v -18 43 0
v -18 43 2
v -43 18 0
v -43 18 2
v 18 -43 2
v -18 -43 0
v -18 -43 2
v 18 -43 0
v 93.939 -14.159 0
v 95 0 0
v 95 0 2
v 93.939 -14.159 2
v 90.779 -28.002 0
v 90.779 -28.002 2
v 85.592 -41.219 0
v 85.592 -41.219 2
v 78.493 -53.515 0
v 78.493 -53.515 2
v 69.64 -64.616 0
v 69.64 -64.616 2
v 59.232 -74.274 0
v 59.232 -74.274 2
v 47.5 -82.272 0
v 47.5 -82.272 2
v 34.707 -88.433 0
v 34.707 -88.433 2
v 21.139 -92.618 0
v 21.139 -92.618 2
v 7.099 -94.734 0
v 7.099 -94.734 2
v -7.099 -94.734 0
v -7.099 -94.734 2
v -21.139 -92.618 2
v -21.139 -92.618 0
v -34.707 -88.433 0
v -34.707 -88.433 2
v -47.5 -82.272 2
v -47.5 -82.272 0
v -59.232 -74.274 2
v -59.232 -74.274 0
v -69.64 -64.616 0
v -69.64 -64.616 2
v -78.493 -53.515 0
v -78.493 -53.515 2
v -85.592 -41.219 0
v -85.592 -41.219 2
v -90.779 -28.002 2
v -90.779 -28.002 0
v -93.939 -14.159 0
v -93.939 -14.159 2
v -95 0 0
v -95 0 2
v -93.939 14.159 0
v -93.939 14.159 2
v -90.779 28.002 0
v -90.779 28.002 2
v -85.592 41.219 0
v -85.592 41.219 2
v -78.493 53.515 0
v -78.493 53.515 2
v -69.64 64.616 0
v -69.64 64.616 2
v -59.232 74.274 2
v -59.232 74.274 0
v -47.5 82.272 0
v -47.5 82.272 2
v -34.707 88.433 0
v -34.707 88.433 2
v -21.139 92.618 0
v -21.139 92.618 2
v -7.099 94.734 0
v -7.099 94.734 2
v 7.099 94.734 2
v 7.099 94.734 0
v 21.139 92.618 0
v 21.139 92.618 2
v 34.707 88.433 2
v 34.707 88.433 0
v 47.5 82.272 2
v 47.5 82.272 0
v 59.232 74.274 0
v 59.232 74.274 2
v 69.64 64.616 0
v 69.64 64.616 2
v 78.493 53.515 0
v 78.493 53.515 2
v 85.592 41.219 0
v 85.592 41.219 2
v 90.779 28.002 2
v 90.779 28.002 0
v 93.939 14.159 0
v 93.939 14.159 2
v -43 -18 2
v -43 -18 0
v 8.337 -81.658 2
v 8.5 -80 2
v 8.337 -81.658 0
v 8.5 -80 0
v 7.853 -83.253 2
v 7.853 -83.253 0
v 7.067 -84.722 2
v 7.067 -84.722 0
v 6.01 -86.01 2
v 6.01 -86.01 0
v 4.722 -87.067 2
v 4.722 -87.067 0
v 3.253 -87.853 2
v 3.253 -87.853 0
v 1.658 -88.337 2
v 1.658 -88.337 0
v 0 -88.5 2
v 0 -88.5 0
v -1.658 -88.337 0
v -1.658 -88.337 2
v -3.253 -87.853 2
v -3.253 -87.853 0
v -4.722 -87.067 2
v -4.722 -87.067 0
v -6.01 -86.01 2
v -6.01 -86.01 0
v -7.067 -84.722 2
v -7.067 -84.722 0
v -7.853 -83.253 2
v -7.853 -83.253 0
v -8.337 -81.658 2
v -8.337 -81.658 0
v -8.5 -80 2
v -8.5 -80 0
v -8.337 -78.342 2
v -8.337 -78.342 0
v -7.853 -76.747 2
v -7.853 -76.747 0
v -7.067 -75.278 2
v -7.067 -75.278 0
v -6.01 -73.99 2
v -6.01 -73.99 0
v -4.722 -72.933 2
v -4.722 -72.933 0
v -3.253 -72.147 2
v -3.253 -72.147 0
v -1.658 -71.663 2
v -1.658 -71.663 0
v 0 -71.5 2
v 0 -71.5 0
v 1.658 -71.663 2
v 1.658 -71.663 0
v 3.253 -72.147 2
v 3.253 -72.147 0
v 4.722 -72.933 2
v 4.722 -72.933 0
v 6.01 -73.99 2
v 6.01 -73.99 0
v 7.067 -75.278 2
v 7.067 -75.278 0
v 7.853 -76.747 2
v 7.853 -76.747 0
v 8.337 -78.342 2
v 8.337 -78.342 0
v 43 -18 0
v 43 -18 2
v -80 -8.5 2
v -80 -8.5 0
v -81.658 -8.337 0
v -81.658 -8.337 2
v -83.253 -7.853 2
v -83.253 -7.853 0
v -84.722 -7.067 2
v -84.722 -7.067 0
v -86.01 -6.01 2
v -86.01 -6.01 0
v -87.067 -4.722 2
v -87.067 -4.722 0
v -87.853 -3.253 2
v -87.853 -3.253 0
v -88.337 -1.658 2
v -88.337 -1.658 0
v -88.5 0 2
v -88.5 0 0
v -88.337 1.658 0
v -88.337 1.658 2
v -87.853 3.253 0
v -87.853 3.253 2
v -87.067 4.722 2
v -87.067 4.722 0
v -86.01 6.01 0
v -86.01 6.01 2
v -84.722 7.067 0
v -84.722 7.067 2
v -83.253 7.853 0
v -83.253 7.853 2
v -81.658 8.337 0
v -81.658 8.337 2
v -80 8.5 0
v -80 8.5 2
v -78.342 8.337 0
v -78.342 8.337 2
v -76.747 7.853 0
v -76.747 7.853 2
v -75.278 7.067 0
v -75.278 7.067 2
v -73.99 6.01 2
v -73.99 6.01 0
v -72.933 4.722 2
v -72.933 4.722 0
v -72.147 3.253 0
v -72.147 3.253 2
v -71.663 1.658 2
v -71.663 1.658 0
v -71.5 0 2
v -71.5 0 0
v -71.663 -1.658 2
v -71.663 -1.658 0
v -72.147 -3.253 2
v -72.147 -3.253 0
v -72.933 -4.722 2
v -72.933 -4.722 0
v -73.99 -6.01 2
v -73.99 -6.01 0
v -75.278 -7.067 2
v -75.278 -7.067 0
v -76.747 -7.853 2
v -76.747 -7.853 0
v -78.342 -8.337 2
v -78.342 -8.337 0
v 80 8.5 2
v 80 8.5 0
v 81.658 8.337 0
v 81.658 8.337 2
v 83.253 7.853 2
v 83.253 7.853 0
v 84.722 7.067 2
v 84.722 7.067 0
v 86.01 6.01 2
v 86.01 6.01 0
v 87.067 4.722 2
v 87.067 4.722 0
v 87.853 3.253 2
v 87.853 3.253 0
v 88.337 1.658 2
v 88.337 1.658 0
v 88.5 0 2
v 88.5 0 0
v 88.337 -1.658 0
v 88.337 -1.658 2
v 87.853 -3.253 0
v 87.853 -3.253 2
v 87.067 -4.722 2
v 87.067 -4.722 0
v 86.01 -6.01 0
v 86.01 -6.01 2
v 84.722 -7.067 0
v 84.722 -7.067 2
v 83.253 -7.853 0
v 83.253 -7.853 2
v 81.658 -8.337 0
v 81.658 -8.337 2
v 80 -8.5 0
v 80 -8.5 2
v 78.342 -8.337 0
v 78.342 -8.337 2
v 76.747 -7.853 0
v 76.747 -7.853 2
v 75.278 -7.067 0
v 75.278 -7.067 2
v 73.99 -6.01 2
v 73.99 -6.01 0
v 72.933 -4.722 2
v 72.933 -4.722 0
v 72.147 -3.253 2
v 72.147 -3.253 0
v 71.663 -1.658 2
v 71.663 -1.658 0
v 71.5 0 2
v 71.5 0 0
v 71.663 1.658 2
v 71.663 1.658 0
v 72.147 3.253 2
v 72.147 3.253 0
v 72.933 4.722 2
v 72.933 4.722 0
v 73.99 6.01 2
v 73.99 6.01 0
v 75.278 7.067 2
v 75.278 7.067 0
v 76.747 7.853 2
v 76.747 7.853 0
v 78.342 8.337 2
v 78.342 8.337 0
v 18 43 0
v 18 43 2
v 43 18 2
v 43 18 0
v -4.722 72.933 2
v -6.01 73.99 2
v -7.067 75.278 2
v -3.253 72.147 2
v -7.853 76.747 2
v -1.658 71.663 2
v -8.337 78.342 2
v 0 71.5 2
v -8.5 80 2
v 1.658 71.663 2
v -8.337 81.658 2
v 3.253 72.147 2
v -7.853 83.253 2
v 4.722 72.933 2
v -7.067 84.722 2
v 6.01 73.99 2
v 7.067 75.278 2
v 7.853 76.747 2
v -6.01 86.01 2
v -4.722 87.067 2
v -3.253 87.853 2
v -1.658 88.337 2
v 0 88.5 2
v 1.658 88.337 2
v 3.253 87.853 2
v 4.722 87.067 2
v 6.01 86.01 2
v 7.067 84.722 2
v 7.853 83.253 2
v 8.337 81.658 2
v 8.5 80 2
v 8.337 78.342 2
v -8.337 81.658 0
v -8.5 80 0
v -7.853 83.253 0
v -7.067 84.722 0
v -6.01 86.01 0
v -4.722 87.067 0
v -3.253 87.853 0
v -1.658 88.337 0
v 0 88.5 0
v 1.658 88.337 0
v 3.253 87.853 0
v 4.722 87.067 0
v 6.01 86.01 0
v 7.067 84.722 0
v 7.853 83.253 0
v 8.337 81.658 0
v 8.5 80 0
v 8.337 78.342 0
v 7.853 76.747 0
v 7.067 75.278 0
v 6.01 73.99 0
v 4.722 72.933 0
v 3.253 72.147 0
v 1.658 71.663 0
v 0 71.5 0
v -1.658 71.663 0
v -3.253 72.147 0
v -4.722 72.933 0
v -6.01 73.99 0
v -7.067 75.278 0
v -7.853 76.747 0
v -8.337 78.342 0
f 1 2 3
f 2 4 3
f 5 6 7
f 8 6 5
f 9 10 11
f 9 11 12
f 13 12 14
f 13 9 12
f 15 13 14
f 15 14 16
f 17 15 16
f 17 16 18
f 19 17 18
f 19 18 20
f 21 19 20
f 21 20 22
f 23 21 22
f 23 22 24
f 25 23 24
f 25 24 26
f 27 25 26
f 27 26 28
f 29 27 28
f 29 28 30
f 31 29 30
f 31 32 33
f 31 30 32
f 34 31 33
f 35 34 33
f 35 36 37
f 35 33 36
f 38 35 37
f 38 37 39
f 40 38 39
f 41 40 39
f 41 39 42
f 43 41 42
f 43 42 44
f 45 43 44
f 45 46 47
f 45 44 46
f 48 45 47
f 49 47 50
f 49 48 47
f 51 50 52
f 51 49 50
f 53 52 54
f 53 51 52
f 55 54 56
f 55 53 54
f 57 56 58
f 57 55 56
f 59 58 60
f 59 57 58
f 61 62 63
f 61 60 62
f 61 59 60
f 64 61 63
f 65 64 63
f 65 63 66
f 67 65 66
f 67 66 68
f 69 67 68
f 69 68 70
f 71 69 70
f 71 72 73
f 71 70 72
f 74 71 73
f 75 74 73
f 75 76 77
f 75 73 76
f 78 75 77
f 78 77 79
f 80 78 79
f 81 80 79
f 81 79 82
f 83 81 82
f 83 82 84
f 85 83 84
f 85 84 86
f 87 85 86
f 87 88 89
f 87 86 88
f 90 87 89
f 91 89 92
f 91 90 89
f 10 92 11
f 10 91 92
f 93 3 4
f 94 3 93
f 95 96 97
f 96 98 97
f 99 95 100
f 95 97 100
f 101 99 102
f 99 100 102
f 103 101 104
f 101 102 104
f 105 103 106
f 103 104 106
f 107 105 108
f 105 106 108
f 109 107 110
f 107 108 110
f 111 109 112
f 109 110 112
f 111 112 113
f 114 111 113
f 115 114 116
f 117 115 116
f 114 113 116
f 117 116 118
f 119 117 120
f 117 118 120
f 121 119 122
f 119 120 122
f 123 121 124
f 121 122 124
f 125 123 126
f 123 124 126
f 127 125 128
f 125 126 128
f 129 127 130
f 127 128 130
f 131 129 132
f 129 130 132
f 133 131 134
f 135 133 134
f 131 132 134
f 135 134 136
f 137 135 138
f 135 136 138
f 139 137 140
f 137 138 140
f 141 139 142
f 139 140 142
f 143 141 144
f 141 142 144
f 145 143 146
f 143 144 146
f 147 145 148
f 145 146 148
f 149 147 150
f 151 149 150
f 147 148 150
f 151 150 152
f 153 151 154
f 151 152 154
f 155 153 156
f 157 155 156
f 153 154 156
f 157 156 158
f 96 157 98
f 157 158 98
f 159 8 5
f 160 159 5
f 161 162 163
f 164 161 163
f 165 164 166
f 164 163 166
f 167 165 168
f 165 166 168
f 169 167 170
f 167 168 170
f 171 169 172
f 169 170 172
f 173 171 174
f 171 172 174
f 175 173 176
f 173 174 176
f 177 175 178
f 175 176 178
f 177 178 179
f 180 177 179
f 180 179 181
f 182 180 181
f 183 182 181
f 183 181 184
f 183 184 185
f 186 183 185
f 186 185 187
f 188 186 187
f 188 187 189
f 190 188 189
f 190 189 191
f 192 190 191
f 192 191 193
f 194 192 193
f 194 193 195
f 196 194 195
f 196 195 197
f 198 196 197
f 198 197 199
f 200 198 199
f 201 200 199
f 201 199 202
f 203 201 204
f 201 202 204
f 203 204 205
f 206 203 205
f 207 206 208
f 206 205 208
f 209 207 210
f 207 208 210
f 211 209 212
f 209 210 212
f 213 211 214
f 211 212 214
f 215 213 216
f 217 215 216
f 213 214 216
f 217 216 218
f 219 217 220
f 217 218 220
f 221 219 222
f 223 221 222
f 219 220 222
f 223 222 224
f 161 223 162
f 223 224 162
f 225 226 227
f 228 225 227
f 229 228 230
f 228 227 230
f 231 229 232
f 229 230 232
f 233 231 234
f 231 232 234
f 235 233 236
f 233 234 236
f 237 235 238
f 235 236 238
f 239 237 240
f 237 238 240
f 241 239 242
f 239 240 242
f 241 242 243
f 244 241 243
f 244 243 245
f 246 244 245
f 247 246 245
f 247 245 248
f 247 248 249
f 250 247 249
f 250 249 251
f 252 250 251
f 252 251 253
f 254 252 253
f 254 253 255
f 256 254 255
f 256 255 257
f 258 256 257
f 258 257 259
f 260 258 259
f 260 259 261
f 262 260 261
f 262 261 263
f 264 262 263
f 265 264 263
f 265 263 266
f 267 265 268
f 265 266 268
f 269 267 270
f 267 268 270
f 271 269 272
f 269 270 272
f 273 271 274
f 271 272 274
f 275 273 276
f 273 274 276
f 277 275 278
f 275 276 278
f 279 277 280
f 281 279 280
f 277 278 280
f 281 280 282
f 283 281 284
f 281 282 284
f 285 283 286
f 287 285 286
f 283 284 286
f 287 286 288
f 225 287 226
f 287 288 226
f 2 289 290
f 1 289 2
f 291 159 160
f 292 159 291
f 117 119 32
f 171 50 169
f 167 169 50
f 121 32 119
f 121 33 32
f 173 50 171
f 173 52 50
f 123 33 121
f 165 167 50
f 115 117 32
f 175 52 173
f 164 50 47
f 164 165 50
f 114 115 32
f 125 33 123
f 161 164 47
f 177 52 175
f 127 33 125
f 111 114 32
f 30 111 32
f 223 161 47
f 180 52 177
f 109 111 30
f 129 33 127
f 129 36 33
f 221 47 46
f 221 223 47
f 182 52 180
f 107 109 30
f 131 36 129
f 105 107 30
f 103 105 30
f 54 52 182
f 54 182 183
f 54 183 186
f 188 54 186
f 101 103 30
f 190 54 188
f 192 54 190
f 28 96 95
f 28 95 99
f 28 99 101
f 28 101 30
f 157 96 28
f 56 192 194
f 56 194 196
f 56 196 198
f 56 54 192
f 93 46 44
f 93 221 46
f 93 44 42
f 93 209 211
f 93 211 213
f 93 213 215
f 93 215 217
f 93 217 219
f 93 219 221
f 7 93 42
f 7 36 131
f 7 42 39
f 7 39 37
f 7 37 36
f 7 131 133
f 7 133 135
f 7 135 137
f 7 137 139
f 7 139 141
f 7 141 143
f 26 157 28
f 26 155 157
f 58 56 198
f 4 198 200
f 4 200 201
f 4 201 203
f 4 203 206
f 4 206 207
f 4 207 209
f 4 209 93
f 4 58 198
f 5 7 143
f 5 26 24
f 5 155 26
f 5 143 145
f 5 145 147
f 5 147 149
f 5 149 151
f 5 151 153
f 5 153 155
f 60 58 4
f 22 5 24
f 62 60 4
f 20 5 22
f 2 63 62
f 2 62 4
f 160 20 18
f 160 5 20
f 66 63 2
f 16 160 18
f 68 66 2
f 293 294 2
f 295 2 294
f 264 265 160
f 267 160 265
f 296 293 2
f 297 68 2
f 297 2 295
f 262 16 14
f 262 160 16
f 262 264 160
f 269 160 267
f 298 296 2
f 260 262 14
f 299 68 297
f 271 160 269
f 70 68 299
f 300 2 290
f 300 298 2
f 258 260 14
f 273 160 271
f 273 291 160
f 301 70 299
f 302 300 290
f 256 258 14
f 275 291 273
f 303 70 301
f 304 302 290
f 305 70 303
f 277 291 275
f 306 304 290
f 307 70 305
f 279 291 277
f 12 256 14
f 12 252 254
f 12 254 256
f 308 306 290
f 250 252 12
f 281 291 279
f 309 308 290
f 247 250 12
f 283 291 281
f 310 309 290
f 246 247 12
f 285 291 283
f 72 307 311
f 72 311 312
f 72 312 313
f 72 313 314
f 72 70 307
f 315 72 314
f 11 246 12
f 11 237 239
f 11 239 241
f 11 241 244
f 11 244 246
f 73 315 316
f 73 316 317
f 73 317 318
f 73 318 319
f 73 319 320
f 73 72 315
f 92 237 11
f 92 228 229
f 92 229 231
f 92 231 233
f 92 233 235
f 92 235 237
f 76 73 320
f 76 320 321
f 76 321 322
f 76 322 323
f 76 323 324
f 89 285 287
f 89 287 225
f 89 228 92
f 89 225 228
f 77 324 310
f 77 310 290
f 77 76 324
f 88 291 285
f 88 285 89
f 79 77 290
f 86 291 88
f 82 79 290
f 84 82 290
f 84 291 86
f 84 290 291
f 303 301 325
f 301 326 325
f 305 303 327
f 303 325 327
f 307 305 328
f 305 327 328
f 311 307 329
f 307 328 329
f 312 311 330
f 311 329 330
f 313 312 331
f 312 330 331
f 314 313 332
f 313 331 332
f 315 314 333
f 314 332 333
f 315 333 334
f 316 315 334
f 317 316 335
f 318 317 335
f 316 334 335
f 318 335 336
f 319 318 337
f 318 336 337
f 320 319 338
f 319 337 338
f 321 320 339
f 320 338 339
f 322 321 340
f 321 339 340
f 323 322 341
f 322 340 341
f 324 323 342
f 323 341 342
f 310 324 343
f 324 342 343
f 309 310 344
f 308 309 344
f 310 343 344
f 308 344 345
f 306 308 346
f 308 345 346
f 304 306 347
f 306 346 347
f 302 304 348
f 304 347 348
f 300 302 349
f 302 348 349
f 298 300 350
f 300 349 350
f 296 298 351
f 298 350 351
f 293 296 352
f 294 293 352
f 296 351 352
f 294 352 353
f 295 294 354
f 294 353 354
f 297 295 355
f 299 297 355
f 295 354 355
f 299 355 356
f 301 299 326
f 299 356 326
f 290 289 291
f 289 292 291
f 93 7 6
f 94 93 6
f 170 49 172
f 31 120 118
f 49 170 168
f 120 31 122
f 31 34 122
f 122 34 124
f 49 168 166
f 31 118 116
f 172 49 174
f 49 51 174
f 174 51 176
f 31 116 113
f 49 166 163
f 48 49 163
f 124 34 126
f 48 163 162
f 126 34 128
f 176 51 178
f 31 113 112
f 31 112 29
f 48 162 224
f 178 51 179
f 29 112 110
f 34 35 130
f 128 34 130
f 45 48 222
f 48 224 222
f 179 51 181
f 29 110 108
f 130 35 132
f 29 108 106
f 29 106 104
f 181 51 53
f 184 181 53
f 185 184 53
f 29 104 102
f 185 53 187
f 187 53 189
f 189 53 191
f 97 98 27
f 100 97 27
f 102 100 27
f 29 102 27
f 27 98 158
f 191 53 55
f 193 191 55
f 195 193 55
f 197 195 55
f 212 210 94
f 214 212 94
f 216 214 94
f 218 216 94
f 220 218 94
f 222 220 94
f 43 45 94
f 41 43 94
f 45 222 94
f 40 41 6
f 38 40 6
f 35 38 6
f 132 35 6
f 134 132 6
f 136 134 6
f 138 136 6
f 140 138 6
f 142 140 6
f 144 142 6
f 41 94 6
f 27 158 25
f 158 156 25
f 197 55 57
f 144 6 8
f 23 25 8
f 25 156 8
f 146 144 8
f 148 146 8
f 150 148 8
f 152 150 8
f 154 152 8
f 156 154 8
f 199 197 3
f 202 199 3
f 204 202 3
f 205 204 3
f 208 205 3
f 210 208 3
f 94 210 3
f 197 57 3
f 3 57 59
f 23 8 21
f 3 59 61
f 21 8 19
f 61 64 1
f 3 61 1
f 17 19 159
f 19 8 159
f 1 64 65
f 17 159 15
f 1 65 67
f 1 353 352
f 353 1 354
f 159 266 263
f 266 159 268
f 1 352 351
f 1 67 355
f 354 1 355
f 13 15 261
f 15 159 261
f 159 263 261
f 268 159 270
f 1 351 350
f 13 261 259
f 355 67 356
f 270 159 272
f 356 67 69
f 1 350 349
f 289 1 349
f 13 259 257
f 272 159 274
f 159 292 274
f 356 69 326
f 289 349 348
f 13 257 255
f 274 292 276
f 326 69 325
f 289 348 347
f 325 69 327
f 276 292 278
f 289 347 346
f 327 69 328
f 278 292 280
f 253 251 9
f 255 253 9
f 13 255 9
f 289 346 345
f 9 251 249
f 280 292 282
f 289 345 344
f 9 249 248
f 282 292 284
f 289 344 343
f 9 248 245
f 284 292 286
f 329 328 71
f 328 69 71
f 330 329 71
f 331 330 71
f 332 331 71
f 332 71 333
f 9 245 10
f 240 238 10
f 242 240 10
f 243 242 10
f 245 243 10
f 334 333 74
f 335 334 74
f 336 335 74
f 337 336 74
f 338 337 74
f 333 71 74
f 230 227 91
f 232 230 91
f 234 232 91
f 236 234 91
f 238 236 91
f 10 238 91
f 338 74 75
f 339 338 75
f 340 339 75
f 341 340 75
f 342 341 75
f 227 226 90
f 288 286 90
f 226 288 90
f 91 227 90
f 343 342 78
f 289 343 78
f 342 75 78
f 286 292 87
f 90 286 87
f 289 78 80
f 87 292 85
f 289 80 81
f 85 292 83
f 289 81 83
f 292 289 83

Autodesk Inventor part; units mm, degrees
ref_plane "YZ Plane" through (0, 0, 0) normal (1, 0, 0) x (0, 1, 0)
ref_plane "XZ Plane" through (0, 0, 0) normal (0, 1, 0) x (-1, 0, 0)
ref_plane "XY Plane" through (0, 0, 0) normal (0, 0, 1) x (1, 0, 0)
sketch "Sketch1" plane through (0, 0, 0) normal (0, 0, 1) x (1, 0, 0)
  circle A0 centre (0, 0) radius 95
  line L0 (43, 43) -> (-43, 43)
  line L1 (-43, 43) -> (-43, -43)
  line L2 (-43, -43) -> (43, -43)
  line L3 (43, -43) -> (43, 43)
  line L4 (43, 43) -> (-43, -43) construction
  line L5 (-43, 43) -> (43, -43) construction
  dimension "d157" = 190
  dimension "d158" = 86
  dimension "d159" = 86
extrude "Plate5" add sketch "Sketch1" along normal blind 2
sketch "Sketch7" plane through (0, 0, 0) normal (0, 0, -1) x (-1, 0, 0)
  circle A0 centre (0, 80) radius 8.5
  point P0 (0, 0)
  dimension "d160" = 17
  dimension "d161" = 80
extrude "Cut1" cut sketch "Sketch7" against normal blind 2
pattern_circular "Circular Pattern1" count 4 over 360 about axis through (0, 0, -10) along (0, 0, 1) of "Cut1"
chamfer "Corner Chamfer2" distance 25 angle 45 4 edges at (-43, -43, 1) (43, -43, 1) (-43, 43, 1) (43, 43, 1)
properties part number "PRS 1792 funnel FLANGE 50-90_1000x90_D1200" material "Stainless Steel"
